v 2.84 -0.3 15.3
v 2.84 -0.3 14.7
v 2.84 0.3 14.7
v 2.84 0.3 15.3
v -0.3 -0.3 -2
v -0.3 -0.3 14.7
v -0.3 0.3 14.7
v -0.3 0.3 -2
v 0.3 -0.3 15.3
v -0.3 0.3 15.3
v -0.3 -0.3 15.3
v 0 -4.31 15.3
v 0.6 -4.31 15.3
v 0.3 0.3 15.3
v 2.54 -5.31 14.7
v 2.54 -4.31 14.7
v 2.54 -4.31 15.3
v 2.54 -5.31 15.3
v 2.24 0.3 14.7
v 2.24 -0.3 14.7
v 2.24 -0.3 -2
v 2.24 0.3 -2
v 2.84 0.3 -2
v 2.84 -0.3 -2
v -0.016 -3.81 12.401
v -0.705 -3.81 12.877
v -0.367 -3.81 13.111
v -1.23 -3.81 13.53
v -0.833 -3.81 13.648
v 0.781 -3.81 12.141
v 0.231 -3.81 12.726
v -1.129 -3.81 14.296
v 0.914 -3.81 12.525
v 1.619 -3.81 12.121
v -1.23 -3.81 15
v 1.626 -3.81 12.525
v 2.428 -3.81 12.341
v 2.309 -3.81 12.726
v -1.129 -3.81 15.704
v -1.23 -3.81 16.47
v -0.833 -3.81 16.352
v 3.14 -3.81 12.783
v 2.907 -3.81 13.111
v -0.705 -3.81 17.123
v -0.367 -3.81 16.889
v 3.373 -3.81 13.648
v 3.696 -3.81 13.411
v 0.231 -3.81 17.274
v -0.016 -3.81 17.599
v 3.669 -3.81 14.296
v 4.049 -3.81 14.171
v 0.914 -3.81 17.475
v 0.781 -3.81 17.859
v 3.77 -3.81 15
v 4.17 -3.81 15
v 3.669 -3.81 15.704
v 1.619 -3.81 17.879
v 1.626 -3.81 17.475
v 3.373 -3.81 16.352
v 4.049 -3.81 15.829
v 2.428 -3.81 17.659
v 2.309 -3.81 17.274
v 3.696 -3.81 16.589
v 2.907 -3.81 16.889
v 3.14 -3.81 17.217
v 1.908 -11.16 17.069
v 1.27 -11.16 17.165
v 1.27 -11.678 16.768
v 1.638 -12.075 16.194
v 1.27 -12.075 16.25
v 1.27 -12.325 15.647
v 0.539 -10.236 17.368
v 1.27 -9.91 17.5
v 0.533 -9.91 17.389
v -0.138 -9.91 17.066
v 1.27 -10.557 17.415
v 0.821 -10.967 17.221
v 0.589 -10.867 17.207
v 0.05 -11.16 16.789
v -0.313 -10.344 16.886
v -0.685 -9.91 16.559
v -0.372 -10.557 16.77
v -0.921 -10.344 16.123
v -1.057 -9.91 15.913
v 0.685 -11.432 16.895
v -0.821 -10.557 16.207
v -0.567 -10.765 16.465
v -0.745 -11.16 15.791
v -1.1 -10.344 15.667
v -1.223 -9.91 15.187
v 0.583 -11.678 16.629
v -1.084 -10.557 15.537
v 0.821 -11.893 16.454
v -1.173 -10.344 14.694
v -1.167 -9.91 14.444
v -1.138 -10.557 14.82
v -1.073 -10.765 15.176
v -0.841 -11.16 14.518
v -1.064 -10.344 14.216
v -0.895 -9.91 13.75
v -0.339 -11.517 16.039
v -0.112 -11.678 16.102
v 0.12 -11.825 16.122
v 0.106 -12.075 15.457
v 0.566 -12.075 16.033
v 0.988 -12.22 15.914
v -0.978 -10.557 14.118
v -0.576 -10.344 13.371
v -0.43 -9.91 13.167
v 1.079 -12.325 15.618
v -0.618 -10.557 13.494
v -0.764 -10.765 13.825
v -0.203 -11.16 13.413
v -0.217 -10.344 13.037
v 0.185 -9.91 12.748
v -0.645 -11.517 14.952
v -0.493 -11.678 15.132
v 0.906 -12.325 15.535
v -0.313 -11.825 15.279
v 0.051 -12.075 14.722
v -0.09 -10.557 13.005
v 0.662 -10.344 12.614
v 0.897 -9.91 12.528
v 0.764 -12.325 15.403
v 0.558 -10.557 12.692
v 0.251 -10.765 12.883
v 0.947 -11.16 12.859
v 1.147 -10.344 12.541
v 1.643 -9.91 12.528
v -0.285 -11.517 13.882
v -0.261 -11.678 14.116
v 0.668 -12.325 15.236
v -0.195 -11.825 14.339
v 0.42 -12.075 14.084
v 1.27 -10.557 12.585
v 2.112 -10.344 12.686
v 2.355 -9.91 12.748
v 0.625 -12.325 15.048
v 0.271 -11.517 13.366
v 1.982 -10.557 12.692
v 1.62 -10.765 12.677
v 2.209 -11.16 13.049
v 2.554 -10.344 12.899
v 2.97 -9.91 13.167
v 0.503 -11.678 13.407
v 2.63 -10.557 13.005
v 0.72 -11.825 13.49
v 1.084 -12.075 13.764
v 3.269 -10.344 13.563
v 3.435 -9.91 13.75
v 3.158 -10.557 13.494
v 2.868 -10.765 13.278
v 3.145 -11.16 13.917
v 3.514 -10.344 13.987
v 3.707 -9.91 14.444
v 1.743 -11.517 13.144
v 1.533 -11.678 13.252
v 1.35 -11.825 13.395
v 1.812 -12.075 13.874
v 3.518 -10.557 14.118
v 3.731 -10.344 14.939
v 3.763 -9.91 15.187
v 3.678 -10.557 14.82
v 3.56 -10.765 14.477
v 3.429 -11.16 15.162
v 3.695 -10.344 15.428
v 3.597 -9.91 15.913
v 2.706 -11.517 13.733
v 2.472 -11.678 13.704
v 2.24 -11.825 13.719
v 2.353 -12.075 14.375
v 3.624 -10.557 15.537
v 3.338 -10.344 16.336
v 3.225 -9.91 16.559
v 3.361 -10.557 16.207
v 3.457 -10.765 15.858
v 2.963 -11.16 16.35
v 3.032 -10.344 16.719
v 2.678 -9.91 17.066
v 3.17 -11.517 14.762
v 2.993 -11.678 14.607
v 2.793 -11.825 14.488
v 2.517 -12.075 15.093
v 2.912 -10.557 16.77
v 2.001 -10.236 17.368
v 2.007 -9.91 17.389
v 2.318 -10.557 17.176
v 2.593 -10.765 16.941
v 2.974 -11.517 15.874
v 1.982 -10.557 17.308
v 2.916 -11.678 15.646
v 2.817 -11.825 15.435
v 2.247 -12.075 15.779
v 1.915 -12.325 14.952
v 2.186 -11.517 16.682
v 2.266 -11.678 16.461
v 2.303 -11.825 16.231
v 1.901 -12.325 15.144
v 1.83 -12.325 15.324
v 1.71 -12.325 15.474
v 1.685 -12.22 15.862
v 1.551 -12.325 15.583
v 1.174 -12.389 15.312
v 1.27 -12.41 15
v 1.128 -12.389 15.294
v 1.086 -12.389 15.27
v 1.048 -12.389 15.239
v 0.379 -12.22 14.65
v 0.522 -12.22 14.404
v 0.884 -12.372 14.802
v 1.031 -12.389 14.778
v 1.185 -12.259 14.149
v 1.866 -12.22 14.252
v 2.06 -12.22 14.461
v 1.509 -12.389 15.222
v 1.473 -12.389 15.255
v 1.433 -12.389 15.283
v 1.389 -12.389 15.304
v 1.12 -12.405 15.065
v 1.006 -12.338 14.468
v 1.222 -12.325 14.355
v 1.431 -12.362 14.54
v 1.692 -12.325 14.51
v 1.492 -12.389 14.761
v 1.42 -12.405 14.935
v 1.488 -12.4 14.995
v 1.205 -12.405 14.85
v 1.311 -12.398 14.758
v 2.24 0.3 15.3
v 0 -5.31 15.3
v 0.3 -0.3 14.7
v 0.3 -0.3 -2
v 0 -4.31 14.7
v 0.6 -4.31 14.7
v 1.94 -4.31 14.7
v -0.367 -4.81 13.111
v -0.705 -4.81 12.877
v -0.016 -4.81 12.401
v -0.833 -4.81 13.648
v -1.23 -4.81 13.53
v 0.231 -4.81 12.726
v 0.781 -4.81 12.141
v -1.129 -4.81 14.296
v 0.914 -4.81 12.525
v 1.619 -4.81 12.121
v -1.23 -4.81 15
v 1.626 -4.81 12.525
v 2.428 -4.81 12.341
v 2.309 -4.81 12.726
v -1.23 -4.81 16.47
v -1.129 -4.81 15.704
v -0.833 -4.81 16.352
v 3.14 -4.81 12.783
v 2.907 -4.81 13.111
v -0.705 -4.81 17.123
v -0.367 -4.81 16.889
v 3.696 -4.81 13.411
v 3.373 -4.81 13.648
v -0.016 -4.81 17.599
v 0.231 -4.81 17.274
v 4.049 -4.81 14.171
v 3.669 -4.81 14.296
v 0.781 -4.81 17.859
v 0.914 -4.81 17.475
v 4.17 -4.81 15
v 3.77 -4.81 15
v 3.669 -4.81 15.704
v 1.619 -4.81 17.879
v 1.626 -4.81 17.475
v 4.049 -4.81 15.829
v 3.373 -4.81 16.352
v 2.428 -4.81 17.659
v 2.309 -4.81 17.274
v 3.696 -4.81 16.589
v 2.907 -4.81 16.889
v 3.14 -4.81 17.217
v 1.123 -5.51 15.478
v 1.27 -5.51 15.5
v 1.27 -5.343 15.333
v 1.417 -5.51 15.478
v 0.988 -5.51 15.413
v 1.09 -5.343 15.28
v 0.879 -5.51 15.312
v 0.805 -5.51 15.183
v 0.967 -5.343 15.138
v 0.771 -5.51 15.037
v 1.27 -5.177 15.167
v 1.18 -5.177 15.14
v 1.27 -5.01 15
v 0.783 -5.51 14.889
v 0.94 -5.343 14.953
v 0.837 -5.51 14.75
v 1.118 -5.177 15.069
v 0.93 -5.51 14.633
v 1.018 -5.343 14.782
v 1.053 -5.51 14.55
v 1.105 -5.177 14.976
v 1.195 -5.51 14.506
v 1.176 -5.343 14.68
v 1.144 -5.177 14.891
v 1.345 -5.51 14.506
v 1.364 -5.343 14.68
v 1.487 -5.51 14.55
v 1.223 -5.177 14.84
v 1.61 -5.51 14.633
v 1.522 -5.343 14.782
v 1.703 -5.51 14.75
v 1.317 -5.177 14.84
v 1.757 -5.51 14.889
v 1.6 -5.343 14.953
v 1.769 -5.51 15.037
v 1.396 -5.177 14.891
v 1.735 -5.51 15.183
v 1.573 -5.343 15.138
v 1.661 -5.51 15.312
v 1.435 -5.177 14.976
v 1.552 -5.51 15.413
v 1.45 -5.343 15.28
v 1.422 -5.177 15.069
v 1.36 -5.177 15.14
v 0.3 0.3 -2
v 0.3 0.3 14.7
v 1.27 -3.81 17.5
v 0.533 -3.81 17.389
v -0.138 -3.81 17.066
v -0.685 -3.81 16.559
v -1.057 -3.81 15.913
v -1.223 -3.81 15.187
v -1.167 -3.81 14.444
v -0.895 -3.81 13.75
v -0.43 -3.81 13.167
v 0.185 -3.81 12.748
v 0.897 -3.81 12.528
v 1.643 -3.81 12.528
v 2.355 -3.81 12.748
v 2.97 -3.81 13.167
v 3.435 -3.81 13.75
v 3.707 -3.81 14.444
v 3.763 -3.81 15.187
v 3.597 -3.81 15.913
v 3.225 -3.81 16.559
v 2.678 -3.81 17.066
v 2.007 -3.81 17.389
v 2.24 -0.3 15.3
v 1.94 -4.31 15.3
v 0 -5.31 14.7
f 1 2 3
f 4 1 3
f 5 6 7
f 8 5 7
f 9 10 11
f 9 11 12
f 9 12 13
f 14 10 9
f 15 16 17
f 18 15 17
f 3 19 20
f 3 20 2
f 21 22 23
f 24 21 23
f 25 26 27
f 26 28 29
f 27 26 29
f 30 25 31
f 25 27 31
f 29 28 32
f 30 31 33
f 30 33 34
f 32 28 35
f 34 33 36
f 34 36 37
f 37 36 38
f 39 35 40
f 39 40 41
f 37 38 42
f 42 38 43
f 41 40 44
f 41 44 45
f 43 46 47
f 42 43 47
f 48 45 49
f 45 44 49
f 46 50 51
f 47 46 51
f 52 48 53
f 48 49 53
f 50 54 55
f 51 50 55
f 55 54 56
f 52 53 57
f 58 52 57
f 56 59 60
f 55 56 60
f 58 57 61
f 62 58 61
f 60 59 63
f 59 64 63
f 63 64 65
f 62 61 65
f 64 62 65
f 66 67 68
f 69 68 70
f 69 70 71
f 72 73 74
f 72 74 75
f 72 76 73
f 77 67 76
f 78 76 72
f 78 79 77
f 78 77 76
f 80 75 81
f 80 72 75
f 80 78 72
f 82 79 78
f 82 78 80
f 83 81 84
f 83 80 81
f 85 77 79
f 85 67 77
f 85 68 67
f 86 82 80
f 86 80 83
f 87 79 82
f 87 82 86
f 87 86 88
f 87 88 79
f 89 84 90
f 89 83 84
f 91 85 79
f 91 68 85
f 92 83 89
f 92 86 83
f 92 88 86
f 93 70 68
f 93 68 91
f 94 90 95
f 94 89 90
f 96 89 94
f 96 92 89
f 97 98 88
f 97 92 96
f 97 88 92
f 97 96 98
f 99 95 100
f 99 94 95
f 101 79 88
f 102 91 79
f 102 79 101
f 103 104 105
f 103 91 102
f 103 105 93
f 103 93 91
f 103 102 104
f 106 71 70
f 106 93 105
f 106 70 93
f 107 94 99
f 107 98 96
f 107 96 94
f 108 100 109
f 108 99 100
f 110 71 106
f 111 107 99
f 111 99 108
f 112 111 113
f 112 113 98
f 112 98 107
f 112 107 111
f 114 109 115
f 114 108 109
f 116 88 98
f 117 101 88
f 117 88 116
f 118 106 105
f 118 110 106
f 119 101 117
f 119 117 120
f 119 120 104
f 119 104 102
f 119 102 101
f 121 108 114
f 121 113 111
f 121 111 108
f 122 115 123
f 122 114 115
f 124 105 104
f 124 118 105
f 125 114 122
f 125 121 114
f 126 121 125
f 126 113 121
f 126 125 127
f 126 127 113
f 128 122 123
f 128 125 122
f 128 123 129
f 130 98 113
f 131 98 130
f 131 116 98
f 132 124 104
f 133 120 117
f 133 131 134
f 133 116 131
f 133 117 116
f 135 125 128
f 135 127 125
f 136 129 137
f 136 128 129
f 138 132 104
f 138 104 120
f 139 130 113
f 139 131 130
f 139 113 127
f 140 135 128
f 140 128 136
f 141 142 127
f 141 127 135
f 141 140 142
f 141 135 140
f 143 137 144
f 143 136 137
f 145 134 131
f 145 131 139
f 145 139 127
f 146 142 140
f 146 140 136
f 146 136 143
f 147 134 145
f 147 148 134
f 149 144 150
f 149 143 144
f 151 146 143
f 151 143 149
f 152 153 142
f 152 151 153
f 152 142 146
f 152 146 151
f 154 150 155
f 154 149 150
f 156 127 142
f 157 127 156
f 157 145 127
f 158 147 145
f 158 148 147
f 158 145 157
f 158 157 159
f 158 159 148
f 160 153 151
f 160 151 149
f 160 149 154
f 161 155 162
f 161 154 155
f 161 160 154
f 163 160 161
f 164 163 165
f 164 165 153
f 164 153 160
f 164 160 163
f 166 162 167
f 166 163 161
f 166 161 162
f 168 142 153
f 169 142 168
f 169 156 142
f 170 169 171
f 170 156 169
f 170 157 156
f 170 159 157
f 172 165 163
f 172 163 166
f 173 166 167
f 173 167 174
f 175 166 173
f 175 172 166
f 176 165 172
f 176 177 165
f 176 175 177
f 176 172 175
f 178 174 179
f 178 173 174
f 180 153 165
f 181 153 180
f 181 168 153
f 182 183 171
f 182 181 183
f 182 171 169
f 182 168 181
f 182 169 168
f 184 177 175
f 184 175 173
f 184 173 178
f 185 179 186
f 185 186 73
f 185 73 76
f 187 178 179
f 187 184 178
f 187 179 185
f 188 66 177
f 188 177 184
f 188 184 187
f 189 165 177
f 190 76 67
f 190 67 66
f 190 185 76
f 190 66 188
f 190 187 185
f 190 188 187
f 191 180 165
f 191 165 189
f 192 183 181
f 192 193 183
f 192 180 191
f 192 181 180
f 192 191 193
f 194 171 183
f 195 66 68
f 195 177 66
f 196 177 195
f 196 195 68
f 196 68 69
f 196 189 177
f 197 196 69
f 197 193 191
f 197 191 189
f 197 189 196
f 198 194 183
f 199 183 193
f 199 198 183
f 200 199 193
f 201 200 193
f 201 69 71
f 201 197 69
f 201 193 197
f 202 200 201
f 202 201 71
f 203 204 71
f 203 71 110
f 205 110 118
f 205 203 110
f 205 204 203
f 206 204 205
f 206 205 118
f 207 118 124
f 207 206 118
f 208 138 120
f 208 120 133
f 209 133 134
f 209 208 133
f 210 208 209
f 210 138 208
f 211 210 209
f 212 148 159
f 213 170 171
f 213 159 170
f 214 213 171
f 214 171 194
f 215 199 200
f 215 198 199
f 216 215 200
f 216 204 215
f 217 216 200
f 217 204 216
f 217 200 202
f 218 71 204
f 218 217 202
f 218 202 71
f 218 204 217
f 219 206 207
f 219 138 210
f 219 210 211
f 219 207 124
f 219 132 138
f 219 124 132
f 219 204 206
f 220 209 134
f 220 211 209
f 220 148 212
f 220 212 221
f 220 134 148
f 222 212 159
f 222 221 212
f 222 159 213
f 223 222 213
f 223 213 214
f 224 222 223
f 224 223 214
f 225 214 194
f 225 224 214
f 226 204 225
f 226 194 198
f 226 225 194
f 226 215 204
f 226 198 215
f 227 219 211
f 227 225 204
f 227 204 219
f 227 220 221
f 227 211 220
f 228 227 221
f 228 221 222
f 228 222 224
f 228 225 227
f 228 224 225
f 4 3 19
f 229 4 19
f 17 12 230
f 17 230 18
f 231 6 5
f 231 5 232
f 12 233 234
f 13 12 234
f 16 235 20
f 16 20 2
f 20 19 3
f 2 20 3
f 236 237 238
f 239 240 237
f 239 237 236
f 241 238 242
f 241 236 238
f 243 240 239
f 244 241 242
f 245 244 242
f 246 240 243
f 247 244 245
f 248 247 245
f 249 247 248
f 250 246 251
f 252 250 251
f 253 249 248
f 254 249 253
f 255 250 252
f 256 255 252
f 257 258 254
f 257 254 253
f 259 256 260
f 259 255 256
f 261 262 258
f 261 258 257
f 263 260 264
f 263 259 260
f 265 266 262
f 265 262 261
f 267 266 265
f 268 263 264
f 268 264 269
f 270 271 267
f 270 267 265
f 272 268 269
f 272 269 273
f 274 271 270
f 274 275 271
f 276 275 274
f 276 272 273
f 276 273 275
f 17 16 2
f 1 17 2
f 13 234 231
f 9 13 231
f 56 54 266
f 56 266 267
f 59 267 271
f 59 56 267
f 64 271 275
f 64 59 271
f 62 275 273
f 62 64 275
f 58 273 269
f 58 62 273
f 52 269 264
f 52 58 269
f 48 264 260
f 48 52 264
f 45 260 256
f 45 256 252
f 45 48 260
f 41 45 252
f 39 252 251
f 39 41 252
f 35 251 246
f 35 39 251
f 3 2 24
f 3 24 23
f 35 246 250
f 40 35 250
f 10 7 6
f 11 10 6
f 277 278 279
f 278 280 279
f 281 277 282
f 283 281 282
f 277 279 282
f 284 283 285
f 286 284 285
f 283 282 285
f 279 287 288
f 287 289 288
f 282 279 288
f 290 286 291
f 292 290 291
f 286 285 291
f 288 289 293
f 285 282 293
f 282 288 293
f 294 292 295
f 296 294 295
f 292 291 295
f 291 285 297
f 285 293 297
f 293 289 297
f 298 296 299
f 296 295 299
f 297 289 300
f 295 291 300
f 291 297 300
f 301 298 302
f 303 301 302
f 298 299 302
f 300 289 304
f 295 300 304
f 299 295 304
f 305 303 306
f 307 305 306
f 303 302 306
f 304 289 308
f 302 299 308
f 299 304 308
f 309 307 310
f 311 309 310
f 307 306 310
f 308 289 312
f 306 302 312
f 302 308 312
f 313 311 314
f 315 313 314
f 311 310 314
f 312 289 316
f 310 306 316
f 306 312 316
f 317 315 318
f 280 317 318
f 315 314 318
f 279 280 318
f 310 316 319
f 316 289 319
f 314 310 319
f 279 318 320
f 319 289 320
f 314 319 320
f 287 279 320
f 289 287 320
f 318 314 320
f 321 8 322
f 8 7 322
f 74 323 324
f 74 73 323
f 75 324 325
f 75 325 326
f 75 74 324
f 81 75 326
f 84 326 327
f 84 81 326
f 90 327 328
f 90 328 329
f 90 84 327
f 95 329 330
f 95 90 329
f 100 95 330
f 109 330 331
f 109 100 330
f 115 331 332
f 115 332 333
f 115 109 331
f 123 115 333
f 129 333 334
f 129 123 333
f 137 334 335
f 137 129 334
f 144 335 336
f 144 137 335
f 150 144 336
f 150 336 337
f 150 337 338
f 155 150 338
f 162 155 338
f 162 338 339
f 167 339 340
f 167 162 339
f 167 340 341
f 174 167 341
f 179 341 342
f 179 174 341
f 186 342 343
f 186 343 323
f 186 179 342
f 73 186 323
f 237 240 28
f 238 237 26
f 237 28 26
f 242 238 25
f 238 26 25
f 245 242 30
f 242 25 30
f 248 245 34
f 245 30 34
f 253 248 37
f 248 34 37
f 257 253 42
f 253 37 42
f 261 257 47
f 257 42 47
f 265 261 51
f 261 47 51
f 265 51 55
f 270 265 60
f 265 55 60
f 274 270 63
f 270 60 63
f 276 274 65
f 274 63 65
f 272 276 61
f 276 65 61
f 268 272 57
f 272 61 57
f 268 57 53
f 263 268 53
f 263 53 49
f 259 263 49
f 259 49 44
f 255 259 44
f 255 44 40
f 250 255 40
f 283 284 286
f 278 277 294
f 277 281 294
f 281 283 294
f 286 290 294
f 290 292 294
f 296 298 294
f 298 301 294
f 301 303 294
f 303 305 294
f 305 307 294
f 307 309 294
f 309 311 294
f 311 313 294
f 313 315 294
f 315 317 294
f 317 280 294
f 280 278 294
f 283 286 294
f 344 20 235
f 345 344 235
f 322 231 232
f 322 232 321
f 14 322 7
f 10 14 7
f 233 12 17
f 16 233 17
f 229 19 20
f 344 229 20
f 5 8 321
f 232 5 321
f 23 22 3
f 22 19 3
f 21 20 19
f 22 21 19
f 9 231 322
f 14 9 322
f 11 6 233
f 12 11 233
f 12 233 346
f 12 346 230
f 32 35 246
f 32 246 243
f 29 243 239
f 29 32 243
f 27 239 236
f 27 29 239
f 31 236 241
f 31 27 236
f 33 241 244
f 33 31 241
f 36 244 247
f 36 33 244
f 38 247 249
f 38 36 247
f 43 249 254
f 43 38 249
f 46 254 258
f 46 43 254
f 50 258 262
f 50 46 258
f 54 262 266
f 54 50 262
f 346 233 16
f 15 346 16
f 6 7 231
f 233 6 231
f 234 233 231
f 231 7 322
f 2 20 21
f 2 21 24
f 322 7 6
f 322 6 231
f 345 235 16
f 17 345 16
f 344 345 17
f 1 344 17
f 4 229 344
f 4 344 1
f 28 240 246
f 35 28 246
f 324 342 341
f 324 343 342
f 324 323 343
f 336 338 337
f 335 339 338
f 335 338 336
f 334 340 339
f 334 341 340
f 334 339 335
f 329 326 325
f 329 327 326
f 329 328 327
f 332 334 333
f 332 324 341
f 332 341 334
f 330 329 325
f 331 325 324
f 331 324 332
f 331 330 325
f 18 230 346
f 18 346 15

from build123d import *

# Parameters (mm, degrees)
SKETCH_W       = 0.6
SKETCH_H       = 0.6
PAD_DEPTH      = 14.7
PAD_DEPTH_BACK = 2
PAD001_DEPTH   = 0.6
SKETCH002_W    = 2.54
SKETCH002_H    = 0.6
PAD002_DEPTH   = 1
SKETCH004_R    = 2.9
SKETCH004_R_2  = 2.5
PAD003_DEPTH   = 1
SKETCH006_W    = 0.4
SKETCH006_H    = 5.8
POCKET_DEPTH   = 1.001


with BuildPart() as pad:
    # Sketch → Pad (new body, two sides)
    with BuildSketch(Plane.XY) as pad_sk:
        Rectangle(SKETCH_W, SKETCH_H)
        with Locations((2.54, 0)):
            Rectangle(SKETCH_W, SKETCH_H)
    extrude(amount=PAD_DEPTH)
    extrude(pad_sk.sketch, amount=-PAD_DEPTH_BACK)


with BuildPart() as pad001:
    # Sketch001 → Pad001 (new body)
    with BuildSketch(Plane.XY.offset(14.7)):
        Polygon((0.3, 0.3), (-0.3, 0.3), (-0.3, -0.3), (0, -4.31), (0.6, -4.31), (0.3, -0.3), align=None)
        Polygon((2.84, 0.3), (2.24, 0.3), (2.24, -0.3), (1.94, -4.31), (2.54, -4.31), (2.84, -0.3), align=None)
    extrude(amount=PAD001_DEPTH)


with BuildPart() as pad002:
    # Sketch002 → Pad002 (new body)
    with BuildSketch(Plane.XZ.offset(4.31)):
        with Locations((1.27, 15)):
            Rectangle(SKETCH002_W, SKETCH002_H)
    extrude(amount=PAD002_DEPTH)


with BuildPart() as revolution:
    # Sketch003 → Revolution (revolve)
    with BuildSketch(Plane.YZ.offset(1.27)):
        with BuildLine():
            Line((-3.81, 15), (-12.41, 15))
            ThreePointArc((-9.91, 17.5), (-11.677767, 16.767767), (-12.41, 15))
            Line((-3.81, 17.5), (-9.91, 17.5))
            Line((-3.81, 15), (-3.81, 17.5))
        make_face()
    revolve(axis=Axis((1.27, -5.810397, 15), (0, -1, 0)))


with BuildPart() as revolution001:
    # Sketch005 → Revolution001 (revolve)
    with BuildSketch(Plane.YZ.offset(1.27)):
        Polygon((-5.01, 15), (-5.51, 15), (-5.51, 15.5), align=None)
    revolve(axis=Axis((1.27, -3.977201, 15), (0, -1, 0)))


with BuildPart() as pocket:
    # Sketch004 → Pad003 (new body)
    with BuildSketch(Plane.XZ.offset(3.81)):
        with Locations((1.27, 15)):
            Circle(SKETCH004_R)
        with Locations((1.27, 15)):
            Circle(SKETCH004_R_2, mode=Mode.SUBTRACT)
    extrude(amount=PAD003_DEPTH)

    # Sketch006 → Pocket (cut, through all)
    with BuildSketch(Plane.XZ.offset(4.81)):
        with Locations((-1.43, 15)):
            Rectangle(SKETCH006_W, SKETCH006_H)
    extrude(amount=-POCKET_DEPTH, mode=Mode.SUBTRACT)


solid = Compound([pad.part, pad001.part, pad002.part, revolution.part, revolution001.part, pocket.part])
